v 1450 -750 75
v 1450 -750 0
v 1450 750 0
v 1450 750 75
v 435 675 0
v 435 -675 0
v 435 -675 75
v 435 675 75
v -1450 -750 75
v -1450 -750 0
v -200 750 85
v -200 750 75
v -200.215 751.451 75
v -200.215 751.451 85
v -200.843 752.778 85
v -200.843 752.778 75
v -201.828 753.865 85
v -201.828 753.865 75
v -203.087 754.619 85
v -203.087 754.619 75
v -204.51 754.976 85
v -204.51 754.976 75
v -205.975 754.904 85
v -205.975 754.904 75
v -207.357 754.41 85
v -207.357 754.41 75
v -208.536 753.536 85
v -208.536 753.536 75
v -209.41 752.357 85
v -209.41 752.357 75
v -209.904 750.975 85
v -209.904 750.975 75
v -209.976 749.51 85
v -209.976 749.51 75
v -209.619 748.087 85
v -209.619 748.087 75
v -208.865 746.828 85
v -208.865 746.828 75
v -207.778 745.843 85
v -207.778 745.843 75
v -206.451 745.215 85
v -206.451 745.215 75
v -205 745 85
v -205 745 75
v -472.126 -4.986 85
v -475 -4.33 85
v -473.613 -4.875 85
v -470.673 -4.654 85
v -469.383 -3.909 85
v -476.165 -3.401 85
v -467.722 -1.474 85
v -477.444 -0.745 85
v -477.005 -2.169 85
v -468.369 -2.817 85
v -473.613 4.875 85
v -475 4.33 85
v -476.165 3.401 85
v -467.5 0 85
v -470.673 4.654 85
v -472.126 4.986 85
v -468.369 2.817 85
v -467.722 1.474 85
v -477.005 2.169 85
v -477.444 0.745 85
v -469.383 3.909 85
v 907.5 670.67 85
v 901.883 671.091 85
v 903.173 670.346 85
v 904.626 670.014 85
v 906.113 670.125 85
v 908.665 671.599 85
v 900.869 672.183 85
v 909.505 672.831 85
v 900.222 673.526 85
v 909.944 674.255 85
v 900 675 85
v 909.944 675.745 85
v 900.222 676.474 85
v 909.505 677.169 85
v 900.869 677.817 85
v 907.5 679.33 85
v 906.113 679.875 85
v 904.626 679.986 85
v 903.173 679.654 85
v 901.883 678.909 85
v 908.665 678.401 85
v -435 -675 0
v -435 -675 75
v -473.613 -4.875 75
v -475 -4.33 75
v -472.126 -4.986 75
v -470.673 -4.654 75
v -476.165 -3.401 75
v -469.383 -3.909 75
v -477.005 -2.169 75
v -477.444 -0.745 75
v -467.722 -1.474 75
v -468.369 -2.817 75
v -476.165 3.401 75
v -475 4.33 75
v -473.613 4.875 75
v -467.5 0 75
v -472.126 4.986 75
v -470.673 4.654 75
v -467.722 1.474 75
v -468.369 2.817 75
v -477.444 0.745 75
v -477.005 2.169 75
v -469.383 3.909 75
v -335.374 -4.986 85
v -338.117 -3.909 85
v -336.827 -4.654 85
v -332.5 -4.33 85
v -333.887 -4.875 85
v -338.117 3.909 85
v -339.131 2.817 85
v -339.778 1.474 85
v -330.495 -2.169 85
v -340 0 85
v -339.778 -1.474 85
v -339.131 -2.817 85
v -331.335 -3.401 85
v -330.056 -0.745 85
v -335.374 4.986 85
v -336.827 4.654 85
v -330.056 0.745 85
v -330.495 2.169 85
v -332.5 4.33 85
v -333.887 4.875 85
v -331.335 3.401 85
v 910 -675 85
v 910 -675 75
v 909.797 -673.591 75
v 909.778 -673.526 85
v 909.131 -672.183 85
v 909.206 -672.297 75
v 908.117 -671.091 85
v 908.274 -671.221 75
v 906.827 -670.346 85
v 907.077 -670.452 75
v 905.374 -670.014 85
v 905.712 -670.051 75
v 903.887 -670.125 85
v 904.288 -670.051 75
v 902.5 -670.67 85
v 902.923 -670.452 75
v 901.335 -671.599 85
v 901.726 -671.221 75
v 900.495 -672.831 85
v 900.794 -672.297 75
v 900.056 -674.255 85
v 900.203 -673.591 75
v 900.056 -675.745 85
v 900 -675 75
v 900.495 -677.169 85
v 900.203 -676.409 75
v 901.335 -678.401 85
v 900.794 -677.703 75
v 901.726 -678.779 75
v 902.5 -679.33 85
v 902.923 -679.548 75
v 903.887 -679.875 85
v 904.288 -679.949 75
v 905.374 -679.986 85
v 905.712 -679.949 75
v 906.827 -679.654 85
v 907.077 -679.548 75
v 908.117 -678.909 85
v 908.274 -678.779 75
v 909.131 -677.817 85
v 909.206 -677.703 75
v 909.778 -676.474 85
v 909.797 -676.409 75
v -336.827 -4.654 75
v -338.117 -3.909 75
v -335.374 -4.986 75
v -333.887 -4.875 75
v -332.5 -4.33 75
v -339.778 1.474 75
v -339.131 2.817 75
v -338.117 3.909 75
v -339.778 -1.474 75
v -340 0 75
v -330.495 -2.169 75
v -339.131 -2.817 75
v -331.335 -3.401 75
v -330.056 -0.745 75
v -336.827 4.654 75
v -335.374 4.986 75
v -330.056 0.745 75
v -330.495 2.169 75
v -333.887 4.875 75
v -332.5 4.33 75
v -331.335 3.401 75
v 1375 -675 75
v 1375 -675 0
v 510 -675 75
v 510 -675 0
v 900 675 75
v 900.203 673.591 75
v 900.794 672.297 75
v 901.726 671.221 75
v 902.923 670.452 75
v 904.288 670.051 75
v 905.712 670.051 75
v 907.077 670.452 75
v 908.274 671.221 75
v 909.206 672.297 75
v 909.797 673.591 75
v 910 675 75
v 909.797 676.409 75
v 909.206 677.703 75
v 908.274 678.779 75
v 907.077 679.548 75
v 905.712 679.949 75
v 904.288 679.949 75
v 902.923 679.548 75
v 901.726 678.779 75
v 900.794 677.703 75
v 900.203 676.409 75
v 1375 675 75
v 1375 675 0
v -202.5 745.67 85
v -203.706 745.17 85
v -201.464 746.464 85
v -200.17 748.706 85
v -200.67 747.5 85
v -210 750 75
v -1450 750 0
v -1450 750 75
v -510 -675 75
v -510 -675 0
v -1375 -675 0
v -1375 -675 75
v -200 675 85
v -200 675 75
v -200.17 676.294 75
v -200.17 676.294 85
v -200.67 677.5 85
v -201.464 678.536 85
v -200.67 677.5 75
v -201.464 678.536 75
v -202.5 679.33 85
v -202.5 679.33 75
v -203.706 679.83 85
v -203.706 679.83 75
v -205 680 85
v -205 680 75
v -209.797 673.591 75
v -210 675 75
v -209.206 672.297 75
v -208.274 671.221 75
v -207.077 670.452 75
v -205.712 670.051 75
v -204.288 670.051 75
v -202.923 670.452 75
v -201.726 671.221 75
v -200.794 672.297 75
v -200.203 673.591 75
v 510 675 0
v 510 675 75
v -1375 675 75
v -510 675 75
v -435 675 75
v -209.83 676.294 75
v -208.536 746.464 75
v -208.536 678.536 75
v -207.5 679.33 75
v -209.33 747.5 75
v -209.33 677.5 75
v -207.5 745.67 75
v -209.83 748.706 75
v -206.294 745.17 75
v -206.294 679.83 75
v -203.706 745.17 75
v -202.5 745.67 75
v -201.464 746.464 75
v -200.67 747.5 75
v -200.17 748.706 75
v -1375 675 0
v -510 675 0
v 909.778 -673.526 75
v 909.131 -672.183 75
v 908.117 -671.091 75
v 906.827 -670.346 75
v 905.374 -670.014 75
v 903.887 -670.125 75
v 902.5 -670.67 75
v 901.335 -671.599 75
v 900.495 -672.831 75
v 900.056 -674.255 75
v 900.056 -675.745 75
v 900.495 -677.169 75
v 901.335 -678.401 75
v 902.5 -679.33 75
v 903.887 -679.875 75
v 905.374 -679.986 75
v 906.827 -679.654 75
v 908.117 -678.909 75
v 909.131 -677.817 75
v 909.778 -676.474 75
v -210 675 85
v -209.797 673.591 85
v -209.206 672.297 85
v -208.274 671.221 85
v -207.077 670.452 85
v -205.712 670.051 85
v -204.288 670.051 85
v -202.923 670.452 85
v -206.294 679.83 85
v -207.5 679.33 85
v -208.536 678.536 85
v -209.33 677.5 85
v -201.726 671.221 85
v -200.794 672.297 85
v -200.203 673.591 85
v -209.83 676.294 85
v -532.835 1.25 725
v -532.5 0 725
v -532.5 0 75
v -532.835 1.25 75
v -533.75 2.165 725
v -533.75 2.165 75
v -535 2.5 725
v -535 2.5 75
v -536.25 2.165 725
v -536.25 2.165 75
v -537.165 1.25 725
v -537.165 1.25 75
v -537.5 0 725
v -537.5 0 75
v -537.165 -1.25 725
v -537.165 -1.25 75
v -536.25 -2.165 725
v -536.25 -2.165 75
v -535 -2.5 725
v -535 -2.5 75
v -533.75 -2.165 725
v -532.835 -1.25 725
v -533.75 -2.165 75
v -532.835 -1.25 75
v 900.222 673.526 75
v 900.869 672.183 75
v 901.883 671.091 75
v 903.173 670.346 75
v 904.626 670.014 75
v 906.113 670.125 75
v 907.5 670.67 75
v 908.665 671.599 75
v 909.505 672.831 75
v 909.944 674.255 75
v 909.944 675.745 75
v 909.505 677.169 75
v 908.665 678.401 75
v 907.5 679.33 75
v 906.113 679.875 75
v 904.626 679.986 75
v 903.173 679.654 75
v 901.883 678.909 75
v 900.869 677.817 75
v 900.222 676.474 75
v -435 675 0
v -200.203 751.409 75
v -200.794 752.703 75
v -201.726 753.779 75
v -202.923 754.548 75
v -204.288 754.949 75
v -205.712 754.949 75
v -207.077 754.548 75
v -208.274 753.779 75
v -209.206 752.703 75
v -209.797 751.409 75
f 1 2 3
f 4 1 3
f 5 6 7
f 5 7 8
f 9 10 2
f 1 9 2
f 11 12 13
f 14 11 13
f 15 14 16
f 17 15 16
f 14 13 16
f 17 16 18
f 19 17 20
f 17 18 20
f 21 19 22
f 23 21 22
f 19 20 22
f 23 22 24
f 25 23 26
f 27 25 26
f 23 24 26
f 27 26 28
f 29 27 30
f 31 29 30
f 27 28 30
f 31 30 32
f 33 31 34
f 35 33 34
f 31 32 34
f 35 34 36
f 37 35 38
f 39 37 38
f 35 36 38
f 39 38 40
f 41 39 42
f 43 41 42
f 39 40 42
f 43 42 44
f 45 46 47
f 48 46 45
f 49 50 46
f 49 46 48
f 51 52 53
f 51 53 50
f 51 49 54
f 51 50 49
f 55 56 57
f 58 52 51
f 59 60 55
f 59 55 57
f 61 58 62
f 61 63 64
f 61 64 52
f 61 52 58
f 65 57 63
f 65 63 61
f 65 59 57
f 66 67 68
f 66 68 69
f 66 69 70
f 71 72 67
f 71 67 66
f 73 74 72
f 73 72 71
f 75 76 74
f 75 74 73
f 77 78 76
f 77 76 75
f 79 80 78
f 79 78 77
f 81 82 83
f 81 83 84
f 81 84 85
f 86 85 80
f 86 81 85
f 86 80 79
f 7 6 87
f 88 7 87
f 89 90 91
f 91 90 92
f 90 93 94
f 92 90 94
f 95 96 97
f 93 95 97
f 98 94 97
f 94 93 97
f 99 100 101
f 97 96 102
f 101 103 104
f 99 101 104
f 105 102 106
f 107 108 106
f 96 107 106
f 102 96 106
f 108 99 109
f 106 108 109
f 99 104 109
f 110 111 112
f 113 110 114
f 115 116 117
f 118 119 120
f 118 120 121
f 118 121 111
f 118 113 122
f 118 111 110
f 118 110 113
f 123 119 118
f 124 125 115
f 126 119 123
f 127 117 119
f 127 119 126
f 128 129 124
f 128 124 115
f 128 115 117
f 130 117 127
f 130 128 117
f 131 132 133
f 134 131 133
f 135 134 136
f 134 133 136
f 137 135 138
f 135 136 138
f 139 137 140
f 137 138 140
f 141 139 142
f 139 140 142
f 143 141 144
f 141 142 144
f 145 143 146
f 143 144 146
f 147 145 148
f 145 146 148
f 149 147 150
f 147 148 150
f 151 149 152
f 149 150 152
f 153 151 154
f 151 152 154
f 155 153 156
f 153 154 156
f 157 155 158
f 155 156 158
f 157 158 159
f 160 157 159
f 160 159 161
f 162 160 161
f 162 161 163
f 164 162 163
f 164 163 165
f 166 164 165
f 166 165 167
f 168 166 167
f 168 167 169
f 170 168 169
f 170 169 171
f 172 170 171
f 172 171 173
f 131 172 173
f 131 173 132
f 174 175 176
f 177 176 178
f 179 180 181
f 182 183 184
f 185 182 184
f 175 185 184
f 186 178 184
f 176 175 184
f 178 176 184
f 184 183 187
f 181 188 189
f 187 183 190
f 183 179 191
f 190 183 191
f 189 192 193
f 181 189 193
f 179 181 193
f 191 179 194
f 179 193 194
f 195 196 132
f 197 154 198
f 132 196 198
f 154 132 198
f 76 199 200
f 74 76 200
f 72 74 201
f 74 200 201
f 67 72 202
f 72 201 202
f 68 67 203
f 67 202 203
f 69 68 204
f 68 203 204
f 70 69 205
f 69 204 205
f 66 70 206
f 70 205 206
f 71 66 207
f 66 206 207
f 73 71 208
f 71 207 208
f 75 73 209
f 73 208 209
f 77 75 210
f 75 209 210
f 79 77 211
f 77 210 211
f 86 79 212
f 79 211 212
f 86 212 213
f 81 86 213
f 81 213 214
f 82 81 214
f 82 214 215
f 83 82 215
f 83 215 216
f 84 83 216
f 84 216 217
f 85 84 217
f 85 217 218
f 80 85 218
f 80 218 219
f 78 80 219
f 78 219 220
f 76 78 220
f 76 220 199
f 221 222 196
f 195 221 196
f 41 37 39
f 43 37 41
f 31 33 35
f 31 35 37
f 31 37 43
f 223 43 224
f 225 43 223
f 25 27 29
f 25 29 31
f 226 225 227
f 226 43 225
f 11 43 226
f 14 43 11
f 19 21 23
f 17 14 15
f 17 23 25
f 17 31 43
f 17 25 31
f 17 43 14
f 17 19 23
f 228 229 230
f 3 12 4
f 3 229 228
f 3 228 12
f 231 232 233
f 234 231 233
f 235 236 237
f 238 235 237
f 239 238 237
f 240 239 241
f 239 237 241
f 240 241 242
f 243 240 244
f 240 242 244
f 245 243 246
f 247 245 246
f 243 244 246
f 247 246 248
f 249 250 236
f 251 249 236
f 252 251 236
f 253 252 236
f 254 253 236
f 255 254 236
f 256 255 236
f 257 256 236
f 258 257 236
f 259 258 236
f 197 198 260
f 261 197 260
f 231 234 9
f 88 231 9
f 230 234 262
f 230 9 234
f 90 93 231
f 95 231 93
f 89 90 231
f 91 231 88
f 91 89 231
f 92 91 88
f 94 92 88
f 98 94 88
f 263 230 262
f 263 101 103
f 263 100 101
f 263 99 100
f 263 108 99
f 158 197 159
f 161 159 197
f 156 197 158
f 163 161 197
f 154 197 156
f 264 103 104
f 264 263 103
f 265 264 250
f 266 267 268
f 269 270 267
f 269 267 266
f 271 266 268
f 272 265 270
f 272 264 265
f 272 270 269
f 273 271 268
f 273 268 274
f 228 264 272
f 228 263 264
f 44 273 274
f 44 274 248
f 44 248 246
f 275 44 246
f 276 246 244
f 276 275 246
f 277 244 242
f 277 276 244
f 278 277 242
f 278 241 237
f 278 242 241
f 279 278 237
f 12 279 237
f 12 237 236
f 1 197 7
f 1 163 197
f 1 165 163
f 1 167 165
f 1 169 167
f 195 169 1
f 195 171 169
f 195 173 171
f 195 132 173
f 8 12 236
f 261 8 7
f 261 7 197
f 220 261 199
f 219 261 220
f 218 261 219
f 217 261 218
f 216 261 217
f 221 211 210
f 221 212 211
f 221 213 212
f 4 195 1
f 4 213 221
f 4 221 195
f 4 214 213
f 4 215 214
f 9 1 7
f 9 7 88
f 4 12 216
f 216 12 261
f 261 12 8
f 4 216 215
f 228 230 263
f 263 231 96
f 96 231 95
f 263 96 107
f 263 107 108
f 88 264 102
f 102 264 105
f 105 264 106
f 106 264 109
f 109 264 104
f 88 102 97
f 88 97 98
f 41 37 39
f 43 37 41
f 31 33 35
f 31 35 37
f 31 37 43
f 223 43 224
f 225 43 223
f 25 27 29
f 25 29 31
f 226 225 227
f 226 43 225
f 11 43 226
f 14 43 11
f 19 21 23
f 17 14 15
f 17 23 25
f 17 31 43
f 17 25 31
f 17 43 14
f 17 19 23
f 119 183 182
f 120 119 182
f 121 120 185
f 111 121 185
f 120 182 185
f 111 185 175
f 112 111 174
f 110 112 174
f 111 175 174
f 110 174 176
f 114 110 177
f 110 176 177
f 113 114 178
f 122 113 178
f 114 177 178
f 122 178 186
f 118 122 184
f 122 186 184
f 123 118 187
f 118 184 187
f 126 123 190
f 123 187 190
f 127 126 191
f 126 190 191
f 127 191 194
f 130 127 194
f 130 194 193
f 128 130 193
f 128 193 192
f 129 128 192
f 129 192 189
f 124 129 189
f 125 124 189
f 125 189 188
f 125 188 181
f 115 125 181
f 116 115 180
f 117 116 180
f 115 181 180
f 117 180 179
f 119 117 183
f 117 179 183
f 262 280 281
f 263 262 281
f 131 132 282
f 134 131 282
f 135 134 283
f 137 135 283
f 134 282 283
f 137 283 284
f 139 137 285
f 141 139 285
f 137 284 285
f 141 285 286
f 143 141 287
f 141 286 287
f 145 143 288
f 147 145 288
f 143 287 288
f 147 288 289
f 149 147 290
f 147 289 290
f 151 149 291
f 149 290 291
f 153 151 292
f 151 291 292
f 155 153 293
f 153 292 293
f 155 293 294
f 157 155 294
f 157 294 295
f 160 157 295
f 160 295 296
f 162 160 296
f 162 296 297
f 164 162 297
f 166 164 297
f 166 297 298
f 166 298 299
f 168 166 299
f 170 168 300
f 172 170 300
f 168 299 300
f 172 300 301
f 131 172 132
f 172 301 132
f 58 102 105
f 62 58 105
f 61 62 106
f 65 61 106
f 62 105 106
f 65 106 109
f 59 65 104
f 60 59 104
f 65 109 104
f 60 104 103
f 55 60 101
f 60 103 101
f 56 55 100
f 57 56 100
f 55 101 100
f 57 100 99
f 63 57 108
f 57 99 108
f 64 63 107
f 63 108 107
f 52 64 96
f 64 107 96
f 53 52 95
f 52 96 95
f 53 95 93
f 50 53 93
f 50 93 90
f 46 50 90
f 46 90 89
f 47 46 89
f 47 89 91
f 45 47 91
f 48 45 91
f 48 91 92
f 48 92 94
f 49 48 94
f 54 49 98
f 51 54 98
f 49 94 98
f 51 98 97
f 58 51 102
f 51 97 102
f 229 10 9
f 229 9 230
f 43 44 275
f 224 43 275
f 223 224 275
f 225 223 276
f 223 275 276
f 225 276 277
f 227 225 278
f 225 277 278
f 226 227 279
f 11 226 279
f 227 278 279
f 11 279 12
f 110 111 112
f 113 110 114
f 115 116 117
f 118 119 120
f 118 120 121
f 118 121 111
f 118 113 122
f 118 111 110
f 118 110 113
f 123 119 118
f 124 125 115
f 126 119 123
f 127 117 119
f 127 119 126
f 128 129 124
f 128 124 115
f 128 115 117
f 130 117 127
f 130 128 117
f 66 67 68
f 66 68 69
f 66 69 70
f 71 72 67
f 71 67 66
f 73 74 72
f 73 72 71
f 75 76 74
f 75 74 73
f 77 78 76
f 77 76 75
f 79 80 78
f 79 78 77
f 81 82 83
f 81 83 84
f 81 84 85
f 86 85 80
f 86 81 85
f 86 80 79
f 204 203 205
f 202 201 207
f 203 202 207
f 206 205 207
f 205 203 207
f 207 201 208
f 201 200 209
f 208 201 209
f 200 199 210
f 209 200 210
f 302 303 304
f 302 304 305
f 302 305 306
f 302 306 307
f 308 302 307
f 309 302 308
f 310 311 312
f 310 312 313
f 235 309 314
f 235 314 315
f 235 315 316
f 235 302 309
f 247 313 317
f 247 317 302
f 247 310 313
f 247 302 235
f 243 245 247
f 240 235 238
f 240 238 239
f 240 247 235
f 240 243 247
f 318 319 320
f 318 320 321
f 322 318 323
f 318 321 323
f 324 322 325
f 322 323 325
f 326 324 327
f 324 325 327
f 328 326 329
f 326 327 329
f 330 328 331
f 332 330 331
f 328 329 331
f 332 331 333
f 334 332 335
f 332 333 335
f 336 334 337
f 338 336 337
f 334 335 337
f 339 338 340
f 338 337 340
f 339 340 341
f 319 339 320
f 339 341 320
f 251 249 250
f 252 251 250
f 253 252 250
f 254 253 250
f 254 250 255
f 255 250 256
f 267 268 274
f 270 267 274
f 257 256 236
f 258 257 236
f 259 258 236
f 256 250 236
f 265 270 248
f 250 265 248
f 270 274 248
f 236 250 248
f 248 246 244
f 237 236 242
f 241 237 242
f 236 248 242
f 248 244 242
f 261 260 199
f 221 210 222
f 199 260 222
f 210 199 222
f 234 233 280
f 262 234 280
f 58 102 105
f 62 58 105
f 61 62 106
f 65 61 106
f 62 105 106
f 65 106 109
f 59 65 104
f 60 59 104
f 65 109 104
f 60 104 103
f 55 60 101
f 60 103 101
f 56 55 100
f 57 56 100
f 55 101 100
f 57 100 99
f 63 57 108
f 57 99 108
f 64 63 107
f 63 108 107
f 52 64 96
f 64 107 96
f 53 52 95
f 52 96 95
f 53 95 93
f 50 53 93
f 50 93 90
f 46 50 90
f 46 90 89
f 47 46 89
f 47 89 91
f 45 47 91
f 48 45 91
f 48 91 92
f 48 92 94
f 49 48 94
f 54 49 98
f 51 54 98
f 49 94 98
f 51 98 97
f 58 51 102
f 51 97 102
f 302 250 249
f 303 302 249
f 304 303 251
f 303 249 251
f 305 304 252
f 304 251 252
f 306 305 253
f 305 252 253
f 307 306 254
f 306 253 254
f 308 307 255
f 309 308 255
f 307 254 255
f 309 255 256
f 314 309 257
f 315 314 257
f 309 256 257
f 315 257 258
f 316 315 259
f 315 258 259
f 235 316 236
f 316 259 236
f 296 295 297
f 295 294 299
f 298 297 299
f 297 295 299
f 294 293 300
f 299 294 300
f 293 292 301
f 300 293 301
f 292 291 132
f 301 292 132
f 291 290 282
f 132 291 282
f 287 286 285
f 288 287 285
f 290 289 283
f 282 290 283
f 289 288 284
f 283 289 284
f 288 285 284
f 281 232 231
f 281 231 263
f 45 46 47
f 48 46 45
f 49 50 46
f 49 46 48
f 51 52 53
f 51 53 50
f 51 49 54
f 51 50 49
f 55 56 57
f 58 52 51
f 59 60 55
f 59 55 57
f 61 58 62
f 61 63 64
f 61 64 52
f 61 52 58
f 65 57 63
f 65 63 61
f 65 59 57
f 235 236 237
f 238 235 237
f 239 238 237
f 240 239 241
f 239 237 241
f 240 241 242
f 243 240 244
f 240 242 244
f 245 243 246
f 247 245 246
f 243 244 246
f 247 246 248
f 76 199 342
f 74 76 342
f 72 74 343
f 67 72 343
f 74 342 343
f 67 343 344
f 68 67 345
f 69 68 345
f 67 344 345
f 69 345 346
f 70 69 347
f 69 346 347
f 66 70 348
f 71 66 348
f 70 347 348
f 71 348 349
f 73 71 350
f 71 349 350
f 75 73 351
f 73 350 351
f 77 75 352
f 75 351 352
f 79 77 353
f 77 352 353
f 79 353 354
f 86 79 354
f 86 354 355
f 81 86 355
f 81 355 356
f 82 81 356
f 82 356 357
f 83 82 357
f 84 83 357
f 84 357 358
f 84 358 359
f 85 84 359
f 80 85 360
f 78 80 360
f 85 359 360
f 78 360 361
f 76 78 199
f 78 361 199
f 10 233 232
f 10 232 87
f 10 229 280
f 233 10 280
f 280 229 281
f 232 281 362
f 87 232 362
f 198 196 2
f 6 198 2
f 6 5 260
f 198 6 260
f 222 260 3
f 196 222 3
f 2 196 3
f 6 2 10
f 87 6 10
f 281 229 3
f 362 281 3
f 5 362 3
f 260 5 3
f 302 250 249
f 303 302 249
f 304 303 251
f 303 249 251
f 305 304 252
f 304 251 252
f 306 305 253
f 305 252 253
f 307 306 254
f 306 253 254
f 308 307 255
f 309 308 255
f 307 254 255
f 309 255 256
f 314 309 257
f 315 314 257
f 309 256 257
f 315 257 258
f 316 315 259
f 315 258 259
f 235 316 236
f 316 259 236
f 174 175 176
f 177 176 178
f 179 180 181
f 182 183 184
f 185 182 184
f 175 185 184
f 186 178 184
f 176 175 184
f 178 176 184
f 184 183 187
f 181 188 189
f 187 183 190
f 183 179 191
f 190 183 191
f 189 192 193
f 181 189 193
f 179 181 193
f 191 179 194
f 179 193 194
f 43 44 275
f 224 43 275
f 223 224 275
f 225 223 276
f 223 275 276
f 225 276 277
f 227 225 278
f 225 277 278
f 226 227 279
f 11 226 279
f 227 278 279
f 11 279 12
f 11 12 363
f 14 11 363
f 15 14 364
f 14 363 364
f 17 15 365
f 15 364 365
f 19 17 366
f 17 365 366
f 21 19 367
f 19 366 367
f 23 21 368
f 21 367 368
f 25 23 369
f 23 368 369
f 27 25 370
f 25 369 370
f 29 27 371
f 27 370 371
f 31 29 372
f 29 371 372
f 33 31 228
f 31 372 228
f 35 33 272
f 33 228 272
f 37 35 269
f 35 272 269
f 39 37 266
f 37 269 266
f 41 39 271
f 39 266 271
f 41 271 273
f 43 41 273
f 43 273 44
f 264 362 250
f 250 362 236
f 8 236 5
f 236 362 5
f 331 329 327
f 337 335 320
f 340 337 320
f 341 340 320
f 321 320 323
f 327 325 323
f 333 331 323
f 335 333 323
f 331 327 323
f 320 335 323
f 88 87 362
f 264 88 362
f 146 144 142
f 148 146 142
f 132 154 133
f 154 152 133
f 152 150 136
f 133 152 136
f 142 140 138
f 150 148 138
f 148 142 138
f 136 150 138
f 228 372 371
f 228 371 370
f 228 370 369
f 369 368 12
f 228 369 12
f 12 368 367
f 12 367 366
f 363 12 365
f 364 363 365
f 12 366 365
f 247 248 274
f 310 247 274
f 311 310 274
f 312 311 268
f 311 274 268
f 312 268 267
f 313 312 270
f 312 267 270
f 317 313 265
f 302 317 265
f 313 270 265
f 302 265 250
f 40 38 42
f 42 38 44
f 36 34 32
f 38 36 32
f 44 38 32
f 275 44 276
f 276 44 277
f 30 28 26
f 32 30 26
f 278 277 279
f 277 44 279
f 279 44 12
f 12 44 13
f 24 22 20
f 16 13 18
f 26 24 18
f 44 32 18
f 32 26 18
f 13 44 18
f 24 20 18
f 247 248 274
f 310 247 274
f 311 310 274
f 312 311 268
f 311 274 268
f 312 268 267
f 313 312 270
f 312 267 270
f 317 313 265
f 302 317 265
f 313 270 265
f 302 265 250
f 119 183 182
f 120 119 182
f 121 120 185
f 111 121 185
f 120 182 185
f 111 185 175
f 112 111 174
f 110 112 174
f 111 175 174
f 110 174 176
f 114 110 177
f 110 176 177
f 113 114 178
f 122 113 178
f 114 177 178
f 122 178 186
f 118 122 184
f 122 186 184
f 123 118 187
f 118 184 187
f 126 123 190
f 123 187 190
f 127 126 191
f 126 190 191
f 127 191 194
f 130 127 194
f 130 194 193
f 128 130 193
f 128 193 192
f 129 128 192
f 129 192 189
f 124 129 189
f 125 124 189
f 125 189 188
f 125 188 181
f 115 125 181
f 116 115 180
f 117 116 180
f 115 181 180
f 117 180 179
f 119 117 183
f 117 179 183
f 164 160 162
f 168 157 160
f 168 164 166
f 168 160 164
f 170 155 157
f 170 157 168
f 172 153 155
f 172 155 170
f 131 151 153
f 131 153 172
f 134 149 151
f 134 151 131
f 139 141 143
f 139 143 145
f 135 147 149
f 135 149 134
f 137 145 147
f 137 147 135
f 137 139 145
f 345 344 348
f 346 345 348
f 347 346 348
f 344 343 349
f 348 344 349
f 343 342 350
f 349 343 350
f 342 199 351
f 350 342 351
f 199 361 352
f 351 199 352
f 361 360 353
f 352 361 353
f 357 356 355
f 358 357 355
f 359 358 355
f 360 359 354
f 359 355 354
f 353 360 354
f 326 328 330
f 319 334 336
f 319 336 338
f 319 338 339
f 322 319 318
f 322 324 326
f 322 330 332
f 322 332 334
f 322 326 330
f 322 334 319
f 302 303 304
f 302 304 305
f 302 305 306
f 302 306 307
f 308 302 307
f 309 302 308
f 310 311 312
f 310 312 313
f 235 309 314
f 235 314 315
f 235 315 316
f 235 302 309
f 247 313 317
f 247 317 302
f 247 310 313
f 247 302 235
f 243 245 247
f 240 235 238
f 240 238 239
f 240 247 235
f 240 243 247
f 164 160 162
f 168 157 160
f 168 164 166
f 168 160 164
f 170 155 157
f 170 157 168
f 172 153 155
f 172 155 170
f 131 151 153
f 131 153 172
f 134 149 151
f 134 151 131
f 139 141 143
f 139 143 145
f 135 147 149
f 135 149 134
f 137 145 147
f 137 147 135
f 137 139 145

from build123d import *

# Parameters (mm, degrees)
F0_W     = 2900
F0_H     = 1500
F0_W_2   = 75
F0_H_2   = 1350
F1_DEPTH = 75
F2_R     = 5
F3_DEPTH = 10
F4_DEPTH = 10
F5_R     = 2.5
F6_DEPTH = 650


with BuildPart() as f1:
    # F0 (on Top) → F1 (new body)
    with BuildSketch(Plane.XY):
        Rectangle(F0_W, F0_H)
        Polygon((-510, -675), (-1375, -675), (-1375, 675), (-510, 675), (-435, 675), (435, 675), (510, 675), (1375, 675), (1375, -675), (510, -675), (435, -675), (-435, -675), align=None, mode=Mode.SUBTRACT)
        with Locations((-472.5, 0)):
            Rectangle(F0_W_2, F0_H_2)
        with Locations((472.5, 0)):
            Rectangle(F0_W_2, F0_H_2)
    extrude(amount=F1_DEPTH)

    # F2 (on face) → F3 (join)
    with BuildSketch(Plane.XY.offset(75)):
        with Locations((-472.5, 0)):
            Circle(F2_R)
        with BuildLine():
            ThreePointArc((-330, 0), (-335, 5), (-340, 0))
            ThreePointArc((-340, 0), (-335, -5), (-330, 0))
        make_face()
        with BuildLine():
            Line((-205, 680), (-205, 675))
            Line((-205, 675), (-200, 675))
            ThreePointArc((-200, 675), (-201.464466, 678.535534), (-205, 680))
        make_face()
        with BuildLine():
            Line((-200, 675), (-205, 675))
            Line((-205, 675), (-210, 675))
            ThreePointArc((-210, 675), (-205, 670), (-200, 675))
        make_face()
        with BuildLine():
            Line((-210, 675), (-205, 675))
            Line((-205, 675), (-205, 680))
            ThreePointArc((-205, 680), (-208.535534, 678.535534), (-210, 675))
        make_face()
        with BuildLine():
            ThreePointArc((910, 675), (905, 680), (900, 675))
            ThreePointArc((900, 675), (905, 670), (910, 675))
        make_face()
        with BuildLine():
            ThreePointArc((-200, 750), (-208.535534, 753.535534), (-205, 745))
            ThreePointArc((-205, 745), (-201.464466, 746.464466), (-200, 750))
        make_face()
        with BuildLine():
            ThreePointArc((900, -675), (905, -680), (910, -675))
            ThreePointArc((910, -675), (905, -670), (900, -675))
        make_face()
    extrude(amount=F3_DEPTH)


with BuildPart() as f4:
    # F2 (on face) → F4 (new body)
    with BuildSketch(Plane.XY.offset(75)):
        with Locations((-472.5, 0)):
            Circle(F2_R)
        with BuildLine():
            ThreePointArc((-330, 0), (-335, 5), (-340, 0))
            ThreePointArc((-340, 0), (-335, -5), (-330, 0))
        make_face()
        with BuildLine():
            Line((-205, 680), (-205, 675))
            Line((-205, 675), (-200, 675))
            ThreePointArc((-200, 675), (-201.464466, 678.535534), (-205, 680))
        make_face()
        with BuildLine():
            Line((-200, 675), (-205, 675))
            Line((-205, 675), (-210, 675))
            ThreePointArc((-210, 675), (-205, 670), (-200, 675))
        make_face()
        with BuildLine():
            Line((-210, 675), (-205, 675))
            Line((-205, 675), (-205, 680))
            ThreePointArc((-205, 680), (-208.535534, 678.535534), (-210, 675))
        make_face()
        with BuildLine():
            ThreePointArc((910, 675), (905, 680), (900, 675))
            ThreePointArc((900, 675), (905, 670), (910, 675))
        make_face()
        with BuildLine():
            ThreePointArc((-200, 750), (-208.535534, 753.535534), (-205, 745))
            ThreePointArc((-205, 745), (-201.464466, 746.464466), (-200, 750))
        make_face()
        with BuildLine():
            ThreePointArc((900, -675), (905, -680), (910, -675))
            ThreePointArc((910, -675), (905, -670), (900, -675))
        make_face()
    extrude(amount=F4_DEPTH)


with BuildPart() as f6:
    # F5 (on face) → F6 (new body)
    with BuildSketch(Plane.XY.offset(75)):
        with Locations((-535, 0)):
            Circle(F5_R)
    extrude(amount=F6_DEPTH)


solid = Compound([f1.part, f4.part, f6.part])
